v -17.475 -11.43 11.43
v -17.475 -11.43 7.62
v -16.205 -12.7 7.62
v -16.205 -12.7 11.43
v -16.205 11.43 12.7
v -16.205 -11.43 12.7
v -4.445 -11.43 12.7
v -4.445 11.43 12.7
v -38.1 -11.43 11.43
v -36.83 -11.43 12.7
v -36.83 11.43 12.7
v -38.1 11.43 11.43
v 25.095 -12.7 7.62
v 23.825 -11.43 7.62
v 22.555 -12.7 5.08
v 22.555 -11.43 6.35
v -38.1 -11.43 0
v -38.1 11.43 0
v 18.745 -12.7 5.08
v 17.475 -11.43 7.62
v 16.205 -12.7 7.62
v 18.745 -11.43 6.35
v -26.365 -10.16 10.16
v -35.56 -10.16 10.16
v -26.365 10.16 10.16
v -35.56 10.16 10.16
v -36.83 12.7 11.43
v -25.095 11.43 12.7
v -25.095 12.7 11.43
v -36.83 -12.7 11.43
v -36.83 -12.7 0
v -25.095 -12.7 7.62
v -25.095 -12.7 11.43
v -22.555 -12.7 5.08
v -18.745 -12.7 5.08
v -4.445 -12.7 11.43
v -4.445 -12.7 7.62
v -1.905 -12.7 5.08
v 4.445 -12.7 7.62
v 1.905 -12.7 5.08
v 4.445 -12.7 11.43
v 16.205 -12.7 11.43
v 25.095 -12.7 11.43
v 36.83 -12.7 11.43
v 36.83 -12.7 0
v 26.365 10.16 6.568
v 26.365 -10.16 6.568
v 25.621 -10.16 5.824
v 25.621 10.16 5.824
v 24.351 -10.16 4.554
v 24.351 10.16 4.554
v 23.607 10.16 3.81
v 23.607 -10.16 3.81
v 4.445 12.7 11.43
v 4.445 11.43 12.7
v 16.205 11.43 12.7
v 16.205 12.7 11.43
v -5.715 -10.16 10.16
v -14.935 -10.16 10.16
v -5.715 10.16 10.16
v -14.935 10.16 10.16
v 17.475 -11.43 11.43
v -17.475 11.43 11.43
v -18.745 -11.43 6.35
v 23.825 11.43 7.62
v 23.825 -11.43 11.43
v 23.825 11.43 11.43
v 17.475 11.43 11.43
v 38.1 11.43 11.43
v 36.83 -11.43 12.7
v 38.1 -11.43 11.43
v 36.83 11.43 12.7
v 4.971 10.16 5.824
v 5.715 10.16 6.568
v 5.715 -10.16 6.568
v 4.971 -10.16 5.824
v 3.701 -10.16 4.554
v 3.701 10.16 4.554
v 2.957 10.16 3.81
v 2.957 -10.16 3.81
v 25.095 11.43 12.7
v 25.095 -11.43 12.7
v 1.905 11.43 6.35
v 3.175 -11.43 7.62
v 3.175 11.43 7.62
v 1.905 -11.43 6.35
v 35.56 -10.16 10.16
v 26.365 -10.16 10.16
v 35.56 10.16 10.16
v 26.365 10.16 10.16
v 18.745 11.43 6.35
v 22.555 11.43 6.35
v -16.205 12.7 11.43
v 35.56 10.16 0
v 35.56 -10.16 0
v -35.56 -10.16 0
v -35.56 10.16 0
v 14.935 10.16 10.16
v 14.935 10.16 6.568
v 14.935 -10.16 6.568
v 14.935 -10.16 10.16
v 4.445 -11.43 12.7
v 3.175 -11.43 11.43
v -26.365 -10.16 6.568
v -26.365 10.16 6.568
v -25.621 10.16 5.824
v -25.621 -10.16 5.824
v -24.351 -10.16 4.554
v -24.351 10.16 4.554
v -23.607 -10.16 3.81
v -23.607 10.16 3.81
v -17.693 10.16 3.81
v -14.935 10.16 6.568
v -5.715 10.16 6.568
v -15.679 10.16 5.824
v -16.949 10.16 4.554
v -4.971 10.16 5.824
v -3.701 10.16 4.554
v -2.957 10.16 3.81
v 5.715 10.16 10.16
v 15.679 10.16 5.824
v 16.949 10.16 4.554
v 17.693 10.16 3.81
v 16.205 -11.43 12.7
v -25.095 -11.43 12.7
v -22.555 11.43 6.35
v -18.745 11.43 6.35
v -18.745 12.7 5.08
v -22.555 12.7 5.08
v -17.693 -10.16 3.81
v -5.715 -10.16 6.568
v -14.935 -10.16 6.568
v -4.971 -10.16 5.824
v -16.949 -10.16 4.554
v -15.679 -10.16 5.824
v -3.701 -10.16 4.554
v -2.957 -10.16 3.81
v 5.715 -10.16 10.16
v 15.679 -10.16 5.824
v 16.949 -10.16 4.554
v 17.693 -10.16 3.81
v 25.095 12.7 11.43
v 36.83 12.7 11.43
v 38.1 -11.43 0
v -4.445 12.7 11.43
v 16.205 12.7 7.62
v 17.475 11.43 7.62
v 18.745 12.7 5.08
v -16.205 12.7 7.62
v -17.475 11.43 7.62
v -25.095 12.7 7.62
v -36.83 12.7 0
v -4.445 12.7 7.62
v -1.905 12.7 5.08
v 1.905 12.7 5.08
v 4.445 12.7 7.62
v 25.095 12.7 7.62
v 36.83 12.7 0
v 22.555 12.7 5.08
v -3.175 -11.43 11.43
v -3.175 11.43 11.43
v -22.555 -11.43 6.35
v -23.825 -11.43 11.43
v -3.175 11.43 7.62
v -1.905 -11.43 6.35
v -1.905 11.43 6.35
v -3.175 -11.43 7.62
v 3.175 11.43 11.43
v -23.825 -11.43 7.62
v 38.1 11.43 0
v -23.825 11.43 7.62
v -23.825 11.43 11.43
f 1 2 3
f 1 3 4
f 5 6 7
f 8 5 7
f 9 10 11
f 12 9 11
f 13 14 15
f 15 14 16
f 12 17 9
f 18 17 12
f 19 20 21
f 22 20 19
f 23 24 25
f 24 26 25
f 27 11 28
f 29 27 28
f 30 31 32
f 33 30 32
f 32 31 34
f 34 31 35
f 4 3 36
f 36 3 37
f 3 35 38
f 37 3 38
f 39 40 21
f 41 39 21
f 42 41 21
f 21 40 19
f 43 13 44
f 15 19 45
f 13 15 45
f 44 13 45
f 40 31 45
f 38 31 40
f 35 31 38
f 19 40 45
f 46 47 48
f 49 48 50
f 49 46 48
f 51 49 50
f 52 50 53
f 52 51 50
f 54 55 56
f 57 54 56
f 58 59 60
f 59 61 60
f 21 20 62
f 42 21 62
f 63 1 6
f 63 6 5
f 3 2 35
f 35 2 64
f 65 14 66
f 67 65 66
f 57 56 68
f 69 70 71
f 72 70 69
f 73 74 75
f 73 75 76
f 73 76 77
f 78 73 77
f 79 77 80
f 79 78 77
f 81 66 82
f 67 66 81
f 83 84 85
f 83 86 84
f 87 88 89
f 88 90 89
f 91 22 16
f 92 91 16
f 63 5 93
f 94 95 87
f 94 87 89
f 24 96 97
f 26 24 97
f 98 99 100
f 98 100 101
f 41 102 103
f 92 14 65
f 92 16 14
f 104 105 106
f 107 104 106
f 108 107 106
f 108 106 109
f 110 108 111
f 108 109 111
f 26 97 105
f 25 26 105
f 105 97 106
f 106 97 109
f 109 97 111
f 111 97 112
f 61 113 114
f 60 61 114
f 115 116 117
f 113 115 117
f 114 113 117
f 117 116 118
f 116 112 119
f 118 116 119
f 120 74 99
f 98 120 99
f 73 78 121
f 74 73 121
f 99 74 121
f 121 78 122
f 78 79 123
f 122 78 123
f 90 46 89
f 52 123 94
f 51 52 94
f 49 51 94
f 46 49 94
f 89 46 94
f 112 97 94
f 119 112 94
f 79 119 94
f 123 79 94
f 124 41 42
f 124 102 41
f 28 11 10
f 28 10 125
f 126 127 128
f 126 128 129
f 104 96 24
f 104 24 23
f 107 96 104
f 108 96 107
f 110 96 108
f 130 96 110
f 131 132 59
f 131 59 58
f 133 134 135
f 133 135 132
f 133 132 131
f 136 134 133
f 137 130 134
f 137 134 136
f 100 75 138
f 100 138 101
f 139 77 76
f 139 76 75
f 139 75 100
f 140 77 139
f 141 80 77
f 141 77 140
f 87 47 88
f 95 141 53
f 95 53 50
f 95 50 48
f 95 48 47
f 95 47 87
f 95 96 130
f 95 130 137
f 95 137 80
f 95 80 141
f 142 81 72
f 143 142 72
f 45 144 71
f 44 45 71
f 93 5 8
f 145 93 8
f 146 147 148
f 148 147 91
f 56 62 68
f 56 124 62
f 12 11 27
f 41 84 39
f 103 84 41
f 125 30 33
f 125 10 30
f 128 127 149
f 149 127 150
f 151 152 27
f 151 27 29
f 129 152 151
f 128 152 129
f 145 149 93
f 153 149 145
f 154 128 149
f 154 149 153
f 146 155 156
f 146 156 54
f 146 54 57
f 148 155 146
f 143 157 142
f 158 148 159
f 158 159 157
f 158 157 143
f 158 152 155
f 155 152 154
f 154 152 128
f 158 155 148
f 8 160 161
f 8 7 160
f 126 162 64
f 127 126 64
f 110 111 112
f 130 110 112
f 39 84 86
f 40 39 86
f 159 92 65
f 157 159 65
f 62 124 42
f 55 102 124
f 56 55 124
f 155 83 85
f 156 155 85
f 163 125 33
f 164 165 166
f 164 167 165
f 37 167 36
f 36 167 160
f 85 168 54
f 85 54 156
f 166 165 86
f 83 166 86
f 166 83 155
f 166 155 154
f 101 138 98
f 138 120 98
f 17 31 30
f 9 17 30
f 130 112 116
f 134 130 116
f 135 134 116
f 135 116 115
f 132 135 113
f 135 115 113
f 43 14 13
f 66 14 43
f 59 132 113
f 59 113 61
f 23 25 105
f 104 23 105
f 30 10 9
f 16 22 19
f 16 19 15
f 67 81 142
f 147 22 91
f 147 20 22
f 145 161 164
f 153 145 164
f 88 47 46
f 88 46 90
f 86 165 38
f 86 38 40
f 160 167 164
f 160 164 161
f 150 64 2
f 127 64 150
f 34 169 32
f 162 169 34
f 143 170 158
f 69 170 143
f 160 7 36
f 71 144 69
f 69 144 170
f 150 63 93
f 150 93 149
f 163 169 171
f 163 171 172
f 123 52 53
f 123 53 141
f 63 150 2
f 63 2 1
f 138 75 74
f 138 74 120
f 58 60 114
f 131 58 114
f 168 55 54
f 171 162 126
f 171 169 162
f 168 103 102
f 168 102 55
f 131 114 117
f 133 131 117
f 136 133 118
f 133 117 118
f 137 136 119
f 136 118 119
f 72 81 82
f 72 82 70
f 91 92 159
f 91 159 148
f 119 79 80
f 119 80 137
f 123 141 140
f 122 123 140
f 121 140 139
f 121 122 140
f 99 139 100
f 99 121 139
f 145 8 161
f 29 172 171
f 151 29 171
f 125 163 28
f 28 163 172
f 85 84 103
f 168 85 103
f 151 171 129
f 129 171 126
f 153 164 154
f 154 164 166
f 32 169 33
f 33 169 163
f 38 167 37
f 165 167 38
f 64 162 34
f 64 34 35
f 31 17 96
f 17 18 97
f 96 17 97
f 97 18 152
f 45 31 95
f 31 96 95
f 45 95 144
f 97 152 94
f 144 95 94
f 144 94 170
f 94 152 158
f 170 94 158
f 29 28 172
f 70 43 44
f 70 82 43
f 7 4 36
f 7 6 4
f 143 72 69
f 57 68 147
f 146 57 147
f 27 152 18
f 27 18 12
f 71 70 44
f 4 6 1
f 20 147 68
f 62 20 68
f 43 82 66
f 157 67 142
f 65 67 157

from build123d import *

# Parameters (mm, degrees)
F0_W         = 76.2
F0_H         = 25.4
F1_DEPTH     = 12.7
F2_W         = 6.35
F2_H         = 12.7
F3_DEPTH     = 25.401
F4_SIZE      = 1.27
F5_T         = 2.54
F5_T3_DEPTH  = 6.8760512242
F5_T5_DEPTH  = 6.8760512242
F5_T7_DEPTH  = 6.8760512242
F5_T9_DEPTH  = 6.8760512242
F5_T11_DEPTH = 6.8760512242
F5_T13_DEPTH = 6.8760512242
F5_T15_DEPTH = 6.8760512242
F5_T17_DEPTH = 27.94
F5_T19_DEPTH = 6.8760512242
F5_T21_DEPTH = 6.8760512242
F5_T23_DEPTH = 6.8760512242
F5_T25_DEPTH = 6.8760512242
F5_T27_DEPTH = 6.8760512242
F5_T29_DEPTH = 6.8760512242
F5_T31_DEPTH = 6.8760512242


# Not quite as in the source:
# - a shell that OpenCascade refuses in one call is made with other operations: the cavity is built on its own and cut out


with BuildPart() as f1:
    # F0 (on Top) → F1 (new body)
    with BuildSketch(Plane.XY):
        Rectangle(F0_W, F0_H)
    extrude(amount=F1_DEPTH)

    # F2 (on face) → F3 (cut, through all)
    with BuildSketch(Plane.XZ.offset(12.7)):
        with Locations((0, 12.7)):
            Rectangle(F2_W, F2_H)
        with Locations((20.6502, 12.7)):
            Rectangle(F2_W, F2_H)
        with Locations((-20.6502, 12.7)):
            Rectangle(F2_W, F2_H)
    extrude(amount=-F3_DEPTH, mode=Mode.SUBTRACT)

    # F4
    f4_edges = [f1.edges().sort_by_distance(p)[0] for p in [
        (-23.8252, 0, 12.7),
        (-30.9626, -12.7, 12.7),
        (-38.1, 0, 12.7),
        (-30.9626, 12.7, 12.7),
        (-3.175, 0, 12.7),
        (-10.3251, -12.7, 12.7),
        (-17.4752, 0, 12.7),
        (-10.3251, 12.7, 12.7),
        (17.4752, 0, 12.7),
        (10.3251, -12.7, 12.7),
        (3.175, 0, 12.7),
        (10.3251, 12.7, 12.7),
        (38.1, 0, 12.7),
        (30.9626, -12.7, 12.7),
        (23.8252, 0, 12.7),
        (30.9626, 12.7, 12.7),
        (-20.6502, -12.7, 6.35),
        (-17.4752, 0, 6.35),
        (-20.6502, 12.7, 6.35),
        (-23.8252, 0, 6.35),
        (0, -12.7, 6.35),
        (3.175, 0, 6.35),
        (0, 12.7, 6.35),
        (-3.175, 0, 6.35),
        (20.6502, -12.7, 6.35),
        (23.8252, 0, 6.35),
        (20.6502, 12.7, 6.35),
        (17.4752, 0, 6.35),
        (-38.1, -12.7, 6.35),
        (38.1, -12.7, 6.35),
        (38.1, 12.7, 6.35),
        (-38.1, 12.7, 6.35),
        (-23.8252, 12.7, 9.525),
        (-17.4752, 12.7, 9.525),
        (-3.175, 12.7, 9.525),
        (3.175, 12.7, 9.525),
        (17.4752, 12.7, 9.525),
        (23.8252, 12.7, 9.525),
        (-23.8252, -12.7, 9.525),
        (-17.4752, -12.7, 9.525),
        (-3.175, -12.7, 9.525),
        (3.175, -12.7, 9.525),
        (17.4752, -12.7, 9.525),
        (23.8252, -12.7, 9.525),
    ]]
    chamfer(f4_edges, length=F4_SIZE)

    # F5: shell of thickness 2.54, made by hand


with BuildPart() as f5_core1:
    # F5_t2: copy of F1
    add(f1.part)

    # the walls: a layer under each face that stays
    f5_faces = [f5_core1.faces().sort_by_distance(p)[0] for p in [
        (24.5533333333, 12.7, 5.715),
        (37.465, 12.065, 5.715),
        (-37.465, 12.065, 5.715),
        (30.9626, 12.065, 12.065),
        (-30.9626, 12.065, 12.065),
        (24.4602, 12.065, 9.525),
        (-24.4602, 12.065, 9.525),
        (23.5077, 12.065, 6.6675),
        (-23.5077, 12.065, 6.6675),
        (20.6502, 12.065, 5.715),
        (-20.6502, 12.065, 5.715),
        (17.7927, 12.065, 6.6675),
        (-17.7927, 12.065, 6.6675),
        (16.8402, 12.065, 9.525),
        (-16.8402, 12.065, 9.525),
        (10.3251, 12.065, 12.065),
        (-10.3251, 12.065, 12.065),
        (3.81, 12.065, 9.525),
        (-3.81, 12.065, 9.525),
        (2.8575, 12.065, 6.6675),
        (-2.8575, 12.065, 6.6675),
        (0, 12.065, 5.715),
        (38.1, 0, 5.715),
        (-38.1, 0, 5.715),
        (37.465, -12.065, 5.715),
        (-37.465, -12.065, 5.715),
        (-24.5533333333, -12.7, 5.715),
        (37.1475, 12.065, 11.7475),
        (-37.1475, 12.065, 11.7475),
        (30.9626, 0, 12.7),
        (24.7777, 12.065, 11.7475),
        (-24.7777, 12.065, 11.7475),
        (-30.9626, 0, 12.7),
        (23.8252, 0, 9.525),
        (-23.8252, 0, 9.525),
        (23.1902, 0, 6.985),
        (-23.1902, 0, 6.985),
        (20.6502, 0, 6.35),
        (-20.6502, 0, 6.35),
        (18.1102, 0, 6.985),
        (-18.1102, 0, 6.985),
        (16.5227, 12.065, 11.7475),
        (17.4752, 0, 9.525),
        (-17.4752, 0, 9.525),
        (-16.5227, 12.065, 11.7475),
        (10.3251, 0, 12.7),
        (4.1275, 12.065, 11.7475),
        (-4.1275, 12.065, 11.7475),
        (-10.3251, 0, 12.7),
        (3.175, 0, 9.525),
        (-3.175, 0, 9.525),
        (2.54, 0, 6.985),
        (-2.54, 0, 6.985),
        (0, 0, 6.35),
        (37.465, 0, 12.065),
        (-37.465, 0, 12.065),
        (37.1475, -12.065, 11.7475),
        (-37.465, -11.7475, 11.7475),
        (-30.9626, -12.065, 12.065),
        (30.9626, -12.065, 12.065),
        (-24.4602, -12.065, 9.525),
        (24.4602, -12.065, 9.525),
        (-23.5077, -12.065, 6.6675),
        (23.5077, -12.065, 6.6675),
        (-20.6502, -12.065, 5.715),
        (20.6502, -12.065, 5.715),
        (-17.7927, -12.065, 6.6675),
        (17.7927, -12.065, 6.6675),
        (-16.8402, -12.065, 9.525),
        (16.8402, -12.065, 9.525),
        (-10.3251, -12.065, 12.065),
        (10.3251, -12.065, 12.065),
        (-3.81, -12.065, 9.525),
        (3.81, -12.065, 9.525),
        (-2.8575, -12.065, 6.6675),
        (2.8575, -12.065, 6.6675),
        (0, -12.065, 5.715),
        (24.4602, 0, 12.065),
        (-24.4602, 0, 12.065),
        (16.8402, 0, 12.065),
        (-16.8402, 0, 12.065),
        (3.81, 0, 12.065),
        (-3.81, 0, 12.065),
        (-24.7777, -12.065, 11.7475),
        (24.4602, -11.7475, 11.7475),
        (-16.8402, -11.7475, 11.7475),
        (16.5227, -12.065, 11.7475),
        (-4.1275, -12.065, 11.7475),
        (3.81, -11.7475, 11.7475),
    ]]
    thicken(f5_faces, amount=-F5_T, mode=Mode.SUBTRACT)

    # F5_s4 → F5_t3 (cut)
    with BuildSketch(Plane(origin=(20.6936512242, 20.6936512242, 0), x_dir=(0, 0, 1), z_dir=(-0.7071067812, -0.7071067812, 0))):
        Polygon((7.6346646968, -8.718590961), (7.62, -11.3047299742), (6.8126933972, -11.3047299742), (6.1535303163, -10.8386312897), align=None)
    extrude(amount=F5_T3_DEPTH, mode=Mode.SUBTRACT)

    # F5_s6 → F5_t5 (cut)
    with BuildSketch(Plane(origin=(-20.6936512242, 20.6936512242, 0), x_dir=(0, 0, 1), z_dir=(0.7071067812, -0.7071067812, 0))):
        Polygon((7.6346646968, 8.718590961), (7.62, 11.3047299742), (6.8126933972, 11.3047299742), (6.1535303163, 10.8386312897), align=None)
    extrude(amount=F5_T5_DEPTH, mode=Mode.SUBTRACT)

    # F5_s8 → F5_t7 (cut)
    with BuildSketch(Plane(origin=(0, 5.6060512242, -5.6060512242), x_dir=(1, 0, 0), z_dir=(0, -0.7071067812, 0.7071067812))):
        Polygon((22.5405353032, 12.6184975827), (24.0216696837, 10.4984572539), (23.3625066028, 10.0323585695), (22.5552, 10.0323585695), align=None)
        Polygon((-22.5405353032, 12.6184975827), (-24.0216696837, 10.4984572539), (-23.3625066028, 10.0323585695), (-22.5552, 10.0323585695), align=None)
        Polygon((18.7598646968, 12.6184975827), (18.7452, 10.0323585695), (17.9378933972, 10.0323585695), (17.2787303163, 10.4984572539), align=None)
        Polygon((-18.7598646968, 12.6184975827), (-18.7452, 10.0323585695), (-17.9378933972, 10.0323585695), (-17.2787303163, 10.4984572539), align=None)
        Polygon((1.8903353032, 12.6184975827), (3.3714696837, 10.4984572539), (2.7123066028, 10.0323585695), (1.905, 10.0323585695), align=None)
        Polygon((-1.8903353032, 12.6184975827), (-3.3714696837, 10.4984572539), (-2.7123066028, 10.0323585695), (-1.905, 10.0323585695), align=None)
    extrude(amount=F5_T7_DEPTH, mode=Mode.SUBTRACT)

    # F5_s10 → F5_t9 (cut)
    with BuildSketch(Plane(origin=(-0.0434512242, 0.0434512242, 0), x_dir=(0, 0, 1), z_dir=(0.7071067812, -0.7071067812, 0))):
        Polygon((7.6346646968, -20.4852019447), (6.1535303163, -18.365161616), (6.8126933972, -17.8990629316), (7.62, -17.8990629316), align=None)
    extrude(amount=F5_T9_DEPTH, mode=Mode.SUBTRACT)

    # F5_s12 → F5_t11 (cut)
    with BuildSketch(Plane(origin=(0.0434512242, 0.0434512242, 0), x_dir=(0, 0, 1), z_dir=(-0.7071067812, -0.7071067812, 0))):
        Polygon((7.6346646968, 20.4852019447), (6.1535303163, 18.365161616), (6.8126933972, 17.8990629316), (7.62, 17.8990629316), align=None)
    extrude(amount=F5_T11_DEPTH, mode=Mode.SUBTRACT)

    # F5_s14 → F5_t13 (cut)
    with BuildSketch(Plane(origin=(10.3685512242, 10.3685512242, 0), x_dir=(0, 0, 1), z_dir=(-0.7071067812, -0.7071067812, 0))):
        Polygon((7.6346646968, 5.8833054919), (7.62, 3.2971664787), (6.8126933972, 3.2971664787), (6.1535303163, 3.7632651631), align=None)
    extrude(amount=F5_T13_DEPTH, mode=Mode.SUBTRACT)

    # F5_s16 → F5_t15 (cut)
    with BuildSketch(Plane(origin=(-10.3685512242, 10.3685512242, 0), x_dir=(0, 0, 1), z_dir=(0.7071067812, -0.7071067812, 0))):
        Polygon((7.6346646968, -5.8833054919), (7.62, -3.2971664787), (6.8126933972, -3.2971664787), (6.1535303163, -3.7632651631), align=None)
    extrude(amount=F5_T15_DEPTH, mode=Mode.SUBTRACT)

    # F5_s18 → F5_t17 (cut)
    with BuildSketch(Plane.XZ.offset(-13.97)):
        Polygon((23.7818394878, 7.6379605122), (26.3652, 7.62), (26.3652, 6.5678975516), (25.6212512242, 5.8239487758), align=None)
        Polygon((-23.7818394878, 7.6379605122), (-26.3652, 7.62), (-26.3652, 6.5678975516), (-25.6212512242, 5.8239487758), align=None)
        Polygon((22.5372394878, 6.3933605122), (24.3512512242, 4.5539487758), (23.6073024484, 3.81), (22.5552, 3.81), align=None)
        Polygon((-22.5372394878, 6.3933605122), (-24.3512512242, 4.5539487758), (-23.6073024484, 3.81), (-22.5552, 3.81), align=None)
        Polygon((18.7631605122, 6.3933605122), (18.7452, 3.81), (17.6930975516, 3.81), (16.9491487758, 4.5539487758), align=None)
        Polygon((-18.7631605122, 6.3933605122), (-18.7452, 3.81), (-17.6930975516, 3.81), (-16.9491487758, 4.5539487758), align=None)
        Polygon((17.5185605122, 7.6379605122), (15.6791487758, 5.8239487758), (14.9352, 6.5678975516), (14.9352, 7.62), align=None)
        Polygon((-17.5185605122, 7.6379605122), (-15.6791487758, 5.8239487758), (-14.9352, 6.5678975516), (-14.9352, 7.62), align=None)
        Polygon((3.1316394878, 7.6379605122), (5.715, 7.62), (5.715, 6.5678975516), (4.9710512242, 5.8239487758), align=None)
        Polygon((-3.1316394878, 7.6379605122), (-5.715, 7.62), (-5.715, 6.5678975516), (-4.9710512242, 5.8239487758), align=None)
        Polygon((1.8870394878, 6.3933605122), (3.7010512242, 4.5539487758), (2.9571024484, 3.81), (1.905, 3.81), align=None)
        Polygon((-1.8870394878, 6.3933605122), (-3.7010512242, 4.5539487758), (-2.9571024484, 3.81), (-1.905, 3.81), align=None)
    extrude(amount=F5_T17_DEPTH, mode=Mode.SUBTRACT)

    # F5_s20 → F5_t19 (cut)
    with BuildSketch(Plane(origin=(-20.6936512242, -20.6936512242, 0), x_dir=(0, 0, 1), z_dir=(0.7071067812, 0.7071067812, 0))):
        Polygon((7.6346646968, -8.718590961), (7.62, -11.3047299742), (6.8126933972, -11.3047299742), (6.1535303163, -10.8386312897), align=None)
    extrude(amount=F5_T19_DEPTH, mode=Mode.SUBTRACT)

    # F5_s22 → F5_t21 (cut)
    with BuildSketch(Plane(origin=(20.6936512242, -20.6936512242, 0), x_dir=(0, 0, 1), z_dir=(-0.7071067812, 0.7071067812, 0))):
        Polygon((7.6346646968, 8.718590961), (7.62, 11.3047299742), (6.8126933972, 11.3047299742), (6.1535303163, 10.8386312897), align=None)
    extrude(amount=F5_T21_DEPTH, mode=Mode.SUBTRACT)

    # F5_s24 → F5_t23 (cut)
    with BuildSketch(Plane(origin=(0, -5.6060512242, -5.6060512242), x_dir=(1, 0, 0), z_dir=(0, 0.7071067812, 0.7071067812))):
        Polygon((-22.5405353032, -12.6184975827), (-24.0216696837, -10.4984572539), (-23.3625066028, -10.0323585695), (-22.5552, -10.0323585695), align=None)
        Polygon((22.5405353032, -12.6184975827), (24.0216696837, -10.4984572539), (23.3625066028, -10.0323585695), (22.5552, -10.0323585695), align=None)
        Polygon((-18.7598646968, -12.6184975827), (-18.7452, -10.0323585695), (-17.9378933972, -10.0323585695), (-17.2787303163, -10.4984572539), align=None)
        Polygon((18.7598646968, -12.6184975827), (18.7452, -10.0323585695), (17.9378933972, -10.0323585695), (17.2787303163, -10.4984572539), align=None)
        Polygon((-1.8903353032, -12.6184975827), (-3.3714696837, -10.4984572539), (-2.7123066028, -10.0323585695), (-1.905, -10.0323585695), align=None)
        Polygon((1.8903353032, -12.6184975827), (3.3714696837, -10.4984572539), (2.7123066028, -10.0323585695), (1.905, -10.0323585695), align=None)
    extrude(amount=F5_T23_DEPTH, mode=Mode.SUBTRACT)

    # F5_s26 → F5_t25 (cut)
    with BuildSketch(Plane(origin=(0.0434512242, -0.0434512242, 0), x_dir=(0, 0, 1), z_dir=(-0.7071067812, 0.7071067812, 0))):
        Polygon((7.6346646968, -20.4852019447), (6.1535303163, -18.365161616), (6.8126933972, -17.8990629316), (7.62, -17.8990629316), align=None)
    extrude(amount=F5_T25_DEPTH, mode=Mode.SUBTRACT)

    # F5_s28 → F5_t27 (cut)
    with BuildSketch(Plane(origin=(-0.0434512242, -0.0434512242, 0), x_dir=(0, 0, 1), z_dir=(0.7071067812, 0.7071067812, 0))):
        Polygon((7.6346646968, 20.4852019447), (6.1535303163, 18.365161616), (6.8126933972, 17.8990629316), (7.62, 17.8990629316), align=None)
    extrude(amount=F5_T27_DEPTH, mode=Mode.SUBTRACT)

    # F5_s30 → F5_t29 (cut)
    with BuildSketch(Plane(origin=(-10.3685512242, -10.3685512242, 0), x_dir=(0, 0, 1), z_dir=(0.7071067812, 0.7071067812, 0))):
        Polygon((7.6346646968, 5.8833054919), (7.62, 3.2971664787), (6.8126933972, 3.2971664787), (6.1535303163, 3.7632651631), align=None)
    extrude(amount=F5_T29_DEPTH, mode=Mode.SUBTRACT)

    # F5_s32 → F5_t31 (cut)
    with BuildSketch(Plane(origin=(10.3685512242, -10.3685512242, 0), x_dir=(0, 0, 1), z_dir=(-0.7071067812, 0.7071067812, 0))):
        Polygon((7.6346646968, -5.8833054919), (7.62, -3.2971664787), (6.8126933972, -3.2971664787), (6.1535303163, -3.7632651631), align=None)
    extrude(amount=F5_T31_DEPTH, mode=Mode.SUBTRACT)


with BuildPart() as f1_1:
    add(f1.part)

    # what is left inside the walls is the cavity
    f5_cavity = [f5_core1.part.solids().sort_by_distance(p)[0] for p in [
        (0, -3.386667, 0.0254),
    ]]
    add(f5_cavity, mode=Mode.SUBTRACT)


solid = f1_1.part
